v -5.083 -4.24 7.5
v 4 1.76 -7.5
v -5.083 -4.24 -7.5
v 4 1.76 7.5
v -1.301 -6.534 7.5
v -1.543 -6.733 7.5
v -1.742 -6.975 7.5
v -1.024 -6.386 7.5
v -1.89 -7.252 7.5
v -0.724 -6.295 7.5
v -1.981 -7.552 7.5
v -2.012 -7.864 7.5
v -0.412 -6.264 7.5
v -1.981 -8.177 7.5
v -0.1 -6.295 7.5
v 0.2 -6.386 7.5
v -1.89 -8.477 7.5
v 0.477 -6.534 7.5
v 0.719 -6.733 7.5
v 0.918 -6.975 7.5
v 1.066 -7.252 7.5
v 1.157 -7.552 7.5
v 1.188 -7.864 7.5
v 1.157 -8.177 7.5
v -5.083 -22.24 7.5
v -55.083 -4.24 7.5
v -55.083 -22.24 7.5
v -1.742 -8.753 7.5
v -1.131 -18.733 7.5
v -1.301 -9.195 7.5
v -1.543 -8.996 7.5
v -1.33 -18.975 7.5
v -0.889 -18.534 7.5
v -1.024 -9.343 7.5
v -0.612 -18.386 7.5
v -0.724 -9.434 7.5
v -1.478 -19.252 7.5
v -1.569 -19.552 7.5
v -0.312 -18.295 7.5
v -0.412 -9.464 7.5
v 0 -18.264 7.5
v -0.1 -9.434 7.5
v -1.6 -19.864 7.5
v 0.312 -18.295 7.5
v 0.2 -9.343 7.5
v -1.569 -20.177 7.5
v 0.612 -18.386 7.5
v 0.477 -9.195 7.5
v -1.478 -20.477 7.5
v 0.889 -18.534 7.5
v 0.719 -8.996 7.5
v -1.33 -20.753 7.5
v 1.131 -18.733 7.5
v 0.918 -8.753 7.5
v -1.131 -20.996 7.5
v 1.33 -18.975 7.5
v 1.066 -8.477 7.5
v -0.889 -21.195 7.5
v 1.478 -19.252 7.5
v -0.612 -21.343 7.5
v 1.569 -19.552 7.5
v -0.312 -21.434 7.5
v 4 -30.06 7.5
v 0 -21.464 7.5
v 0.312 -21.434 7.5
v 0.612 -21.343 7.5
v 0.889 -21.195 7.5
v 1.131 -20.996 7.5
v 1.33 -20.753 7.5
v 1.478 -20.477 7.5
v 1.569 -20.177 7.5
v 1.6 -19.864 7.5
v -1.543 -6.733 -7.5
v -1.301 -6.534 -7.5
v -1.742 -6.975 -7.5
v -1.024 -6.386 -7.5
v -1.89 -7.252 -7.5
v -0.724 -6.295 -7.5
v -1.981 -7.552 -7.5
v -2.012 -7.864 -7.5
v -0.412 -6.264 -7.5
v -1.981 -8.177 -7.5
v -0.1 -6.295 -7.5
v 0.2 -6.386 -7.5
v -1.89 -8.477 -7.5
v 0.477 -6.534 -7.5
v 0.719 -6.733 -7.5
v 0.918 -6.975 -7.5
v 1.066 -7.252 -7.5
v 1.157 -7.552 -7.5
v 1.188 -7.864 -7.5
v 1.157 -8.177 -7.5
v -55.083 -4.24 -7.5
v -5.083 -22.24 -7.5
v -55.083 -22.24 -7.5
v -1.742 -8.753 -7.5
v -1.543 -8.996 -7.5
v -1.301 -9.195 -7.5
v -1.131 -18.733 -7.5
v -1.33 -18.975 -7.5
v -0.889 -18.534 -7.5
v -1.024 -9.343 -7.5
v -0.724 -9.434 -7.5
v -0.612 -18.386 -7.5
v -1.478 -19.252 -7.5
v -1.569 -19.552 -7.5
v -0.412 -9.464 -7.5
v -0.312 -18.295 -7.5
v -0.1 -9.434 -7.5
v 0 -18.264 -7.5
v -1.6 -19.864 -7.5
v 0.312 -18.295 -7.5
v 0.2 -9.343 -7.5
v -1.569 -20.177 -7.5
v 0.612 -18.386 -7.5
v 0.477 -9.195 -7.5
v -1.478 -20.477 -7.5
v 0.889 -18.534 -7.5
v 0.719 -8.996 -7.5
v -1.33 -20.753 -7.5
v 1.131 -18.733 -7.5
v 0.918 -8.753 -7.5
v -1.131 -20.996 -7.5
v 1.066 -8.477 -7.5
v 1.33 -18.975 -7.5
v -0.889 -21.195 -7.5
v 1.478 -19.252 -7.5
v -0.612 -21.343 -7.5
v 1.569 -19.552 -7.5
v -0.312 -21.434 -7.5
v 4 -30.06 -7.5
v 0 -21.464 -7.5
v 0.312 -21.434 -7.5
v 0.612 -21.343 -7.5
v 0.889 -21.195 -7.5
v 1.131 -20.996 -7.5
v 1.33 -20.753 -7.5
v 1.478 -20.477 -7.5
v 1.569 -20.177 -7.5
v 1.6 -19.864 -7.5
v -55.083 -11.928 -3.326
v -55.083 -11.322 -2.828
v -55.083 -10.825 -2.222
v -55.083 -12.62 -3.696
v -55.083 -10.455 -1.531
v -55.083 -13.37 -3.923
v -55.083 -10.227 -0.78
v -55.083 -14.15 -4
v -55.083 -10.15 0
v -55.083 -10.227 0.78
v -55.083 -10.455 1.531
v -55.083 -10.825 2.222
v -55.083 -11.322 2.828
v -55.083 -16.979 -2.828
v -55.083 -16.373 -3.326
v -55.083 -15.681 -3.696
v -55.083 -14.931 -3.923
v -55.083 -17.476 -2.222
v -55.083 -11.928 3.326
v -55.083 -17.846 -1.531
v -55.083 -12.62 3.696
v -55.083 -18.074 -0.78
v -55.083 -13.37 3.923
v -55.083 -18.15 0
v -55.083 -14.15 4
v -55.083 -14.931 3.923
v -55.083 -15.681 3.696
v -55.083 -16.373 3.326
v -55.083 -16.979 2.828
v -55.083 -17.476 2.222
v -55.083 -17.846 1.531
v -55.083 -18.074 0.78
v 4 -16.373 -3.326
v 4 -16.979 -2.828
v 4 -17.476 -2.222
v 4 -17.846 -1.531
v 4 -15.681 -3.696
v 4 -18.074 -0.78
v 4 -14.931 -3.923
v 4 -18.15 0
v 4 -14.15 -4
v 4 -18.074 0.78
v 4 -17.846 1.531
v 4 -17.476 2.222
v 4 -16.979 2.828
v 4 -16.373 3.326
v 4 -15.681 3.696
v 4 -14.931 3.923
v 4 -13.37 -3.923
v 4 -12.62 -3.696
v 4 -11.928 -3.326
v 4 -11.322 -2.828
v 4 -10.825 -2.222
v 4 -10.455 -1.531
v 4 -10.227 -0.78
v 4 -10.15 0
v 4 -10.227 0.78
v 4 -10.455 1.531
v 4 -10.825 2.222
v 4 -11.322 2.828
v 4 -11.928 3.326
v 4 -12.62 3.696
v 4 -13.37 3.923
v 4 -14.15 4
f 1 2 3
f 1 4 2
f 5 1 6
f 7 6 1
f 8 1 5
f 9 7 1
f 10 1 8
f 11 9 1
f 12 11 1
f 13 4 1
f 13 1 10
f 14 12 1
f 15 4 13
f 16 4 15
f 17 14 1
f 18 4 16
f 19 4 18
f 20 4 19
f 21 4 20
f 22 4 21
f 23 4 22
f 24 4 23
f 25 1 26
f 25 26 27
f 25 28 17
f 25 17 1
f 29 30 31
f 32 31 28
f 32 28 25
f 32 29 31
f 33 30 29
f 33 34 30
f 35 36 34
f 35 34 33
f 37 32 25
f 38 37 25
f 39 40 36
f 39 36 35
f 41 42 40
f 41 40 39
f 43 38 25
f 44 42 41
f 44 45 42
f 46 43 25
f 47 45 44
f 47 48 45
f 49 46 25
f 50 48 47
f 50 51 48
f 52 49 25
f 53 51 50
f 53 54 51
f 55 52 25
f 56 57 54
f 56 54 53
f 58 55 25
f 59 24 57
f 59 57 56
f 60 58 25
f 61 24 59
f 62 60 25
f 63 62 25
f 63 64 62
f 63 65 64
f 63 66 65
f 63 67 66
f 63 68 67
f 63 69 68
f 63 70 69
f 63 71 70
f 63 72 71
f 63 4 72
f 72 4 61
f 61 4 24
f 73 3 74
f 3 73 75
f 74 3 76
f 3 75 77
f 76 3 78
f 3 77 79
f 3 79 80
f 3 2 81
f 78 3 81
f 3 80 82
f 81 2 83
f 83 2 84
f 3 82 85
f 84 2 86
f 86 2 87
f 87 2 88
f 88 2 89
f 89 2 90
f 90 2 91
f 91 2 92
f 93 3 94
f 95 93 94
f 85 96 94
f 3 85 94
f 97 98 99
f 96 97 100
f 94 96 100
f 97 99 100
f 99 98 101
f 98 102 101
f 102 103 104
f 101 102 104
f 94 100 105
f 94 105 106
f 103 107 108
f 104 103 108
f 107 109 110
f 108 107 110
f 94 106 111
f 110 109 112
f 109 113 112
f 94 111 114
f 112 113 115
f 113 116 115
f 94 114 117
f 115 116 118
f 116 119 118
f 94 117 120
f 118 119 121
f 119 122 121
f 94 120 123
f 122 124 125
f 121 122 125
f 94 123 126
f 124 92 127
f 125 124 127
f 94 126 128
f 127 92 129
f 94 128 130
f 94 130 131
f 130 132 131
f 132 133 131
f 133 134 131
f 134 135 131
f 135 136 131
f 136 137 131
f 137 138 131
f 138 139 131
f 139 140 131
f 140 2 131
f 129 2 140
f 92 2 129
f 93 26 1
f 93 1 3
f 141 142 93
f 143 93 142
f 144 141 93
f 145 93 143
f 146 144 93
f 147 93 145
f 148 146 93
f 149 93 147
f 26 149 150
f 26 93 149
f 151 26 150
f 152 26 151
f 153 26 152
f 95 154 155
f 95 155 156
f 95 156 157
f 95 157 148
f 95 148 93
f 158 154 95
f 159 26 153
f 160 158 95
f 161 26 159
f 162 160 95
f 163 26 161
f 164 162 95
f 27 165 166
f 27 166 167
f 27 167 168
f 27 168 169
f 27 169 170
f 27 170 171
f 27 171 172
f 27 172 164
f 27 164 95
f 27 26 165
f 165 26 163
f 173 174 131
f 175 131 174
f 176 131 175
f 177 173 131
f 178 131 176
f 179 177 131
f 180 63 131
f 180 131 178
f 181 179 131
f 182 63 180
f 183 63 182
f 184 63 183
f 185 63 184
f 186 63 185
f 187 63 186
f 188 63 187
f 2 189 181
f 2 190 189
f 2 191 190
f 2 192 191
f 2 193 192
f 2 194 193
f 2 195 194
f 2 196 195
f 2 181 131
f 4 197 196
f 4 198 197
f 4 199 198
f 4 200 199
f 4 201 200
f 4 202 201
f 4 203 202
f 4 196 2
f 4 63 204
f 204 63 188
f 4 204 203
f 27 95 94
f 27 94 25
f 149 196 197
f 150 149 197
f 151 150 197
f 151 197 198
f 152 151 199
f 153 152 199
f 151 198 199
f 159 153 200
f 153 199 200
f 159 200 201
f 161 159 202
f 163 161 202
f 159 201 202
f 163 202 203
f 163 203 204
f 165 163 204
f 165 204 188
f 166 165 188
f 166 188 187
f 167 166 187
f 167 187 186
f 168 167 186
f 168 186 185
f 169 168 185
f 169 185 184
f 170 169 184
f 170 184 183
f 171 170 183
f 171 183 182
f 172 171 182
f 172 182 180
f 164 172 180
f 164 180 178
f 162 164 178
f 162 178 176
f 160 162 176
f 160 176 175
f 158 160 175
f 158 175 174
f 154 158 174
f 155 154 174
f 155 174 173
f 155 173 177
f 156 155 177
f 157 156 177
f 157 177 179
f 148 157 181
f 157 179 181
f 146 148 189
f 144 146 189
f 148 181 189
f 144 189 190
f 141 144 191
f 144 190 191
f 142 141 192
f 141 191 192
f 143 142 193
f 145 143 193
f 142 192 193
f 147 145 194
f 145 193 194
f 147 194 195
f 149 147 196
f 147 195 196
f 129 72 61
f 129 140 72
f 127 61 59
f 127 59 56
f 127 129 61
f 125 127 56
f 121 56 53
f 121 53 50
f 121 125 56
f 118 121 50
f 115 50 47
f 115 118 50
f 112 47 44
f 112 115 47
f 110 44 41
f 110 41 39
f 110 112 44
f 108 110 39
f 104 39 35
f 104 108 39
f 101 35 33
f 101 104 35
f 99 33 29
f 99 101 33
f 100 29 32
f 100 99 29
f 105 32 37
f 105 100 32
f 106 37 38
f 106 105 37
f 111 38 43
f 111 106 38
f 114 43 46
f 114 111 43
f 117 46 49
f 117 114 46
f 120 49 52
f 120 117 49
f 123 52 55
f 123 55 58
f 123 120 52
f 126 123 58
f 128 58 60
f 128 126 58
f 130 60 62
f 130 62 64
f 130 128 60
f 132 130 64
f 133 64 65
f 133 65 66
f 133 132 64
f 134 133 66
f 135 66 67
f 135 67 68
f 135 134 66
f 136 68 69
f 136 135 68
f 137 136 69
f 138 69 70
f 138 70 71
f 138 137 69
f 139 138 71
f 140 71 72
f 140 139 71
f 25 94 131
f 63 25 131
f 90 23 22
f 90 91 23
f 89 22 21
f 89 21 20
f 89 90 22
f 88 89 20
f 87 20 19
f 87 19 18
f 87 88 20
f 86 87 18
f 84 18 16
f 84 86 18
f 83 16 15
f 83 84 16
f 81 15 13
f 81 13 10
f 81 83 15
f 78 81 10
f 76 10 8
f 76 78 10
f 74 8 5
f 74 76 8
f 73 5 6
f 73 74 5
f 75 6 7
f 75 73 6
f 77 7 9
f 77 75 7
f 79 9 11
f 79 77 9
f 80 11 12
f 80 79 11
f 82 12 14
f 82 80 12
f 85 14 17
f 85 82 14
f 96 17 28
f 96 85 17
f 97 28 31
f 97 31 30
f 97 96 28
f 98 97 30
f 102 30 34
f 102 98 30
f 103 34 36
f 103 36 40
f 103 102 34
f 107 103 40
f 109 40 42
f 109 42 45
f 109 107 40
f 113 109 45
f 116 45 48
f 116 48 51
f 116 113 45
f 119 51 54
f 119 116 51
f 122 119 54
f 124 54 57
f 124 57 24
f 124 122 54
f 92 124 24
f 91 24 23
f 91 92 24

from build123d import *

# Parameters (mm, degrees)
F0_R     = 1.6
F1_DEPTH = 7.5
F2_DEPTH = 50
F3_R     = 4
F4_DEPTH = 59.0844929405


with BuildPart() as f1:
    # F0 (on Top) → F1 (new body, symmetric)
    with BuildSketch(Plane.XY):
        Polygon((-5.0834929405, -4.2403818204), (-5.0834929405, -22.2403818204), (4, -30.0603818204), (4, 1.7596181796), align=None)
        with Locations((0, -19.8643818204)):
            Circle(F0_R, mode=Mode.SUBTRACT)
        with Locations((-0.412, -7.8643818204)):
            Circle(F0_R, mode=Mode.SUBTRACT)
    extrude(amount=F1_DEPTH, both=True)

    # F2 (add): a face of the model
    f2_faces = [f1.faces().sort_by_distance(p)[0] for p in [
        (-5.0834929405, -13.2403818204, 0),
    ]]
    extrude(f2_faces, amount=F2_DEPTH)

    # F3 (on face) → F4 (cut, through all)
    with BuildSketch(Plane.YZ.offset(4)):
        with Locations((-14.1503818204, 0)):
            Circle(F3_R)
    extrude(amount=-F4_DEPTH, mode=Mode.SUBTRACT)


solid = f1.part
